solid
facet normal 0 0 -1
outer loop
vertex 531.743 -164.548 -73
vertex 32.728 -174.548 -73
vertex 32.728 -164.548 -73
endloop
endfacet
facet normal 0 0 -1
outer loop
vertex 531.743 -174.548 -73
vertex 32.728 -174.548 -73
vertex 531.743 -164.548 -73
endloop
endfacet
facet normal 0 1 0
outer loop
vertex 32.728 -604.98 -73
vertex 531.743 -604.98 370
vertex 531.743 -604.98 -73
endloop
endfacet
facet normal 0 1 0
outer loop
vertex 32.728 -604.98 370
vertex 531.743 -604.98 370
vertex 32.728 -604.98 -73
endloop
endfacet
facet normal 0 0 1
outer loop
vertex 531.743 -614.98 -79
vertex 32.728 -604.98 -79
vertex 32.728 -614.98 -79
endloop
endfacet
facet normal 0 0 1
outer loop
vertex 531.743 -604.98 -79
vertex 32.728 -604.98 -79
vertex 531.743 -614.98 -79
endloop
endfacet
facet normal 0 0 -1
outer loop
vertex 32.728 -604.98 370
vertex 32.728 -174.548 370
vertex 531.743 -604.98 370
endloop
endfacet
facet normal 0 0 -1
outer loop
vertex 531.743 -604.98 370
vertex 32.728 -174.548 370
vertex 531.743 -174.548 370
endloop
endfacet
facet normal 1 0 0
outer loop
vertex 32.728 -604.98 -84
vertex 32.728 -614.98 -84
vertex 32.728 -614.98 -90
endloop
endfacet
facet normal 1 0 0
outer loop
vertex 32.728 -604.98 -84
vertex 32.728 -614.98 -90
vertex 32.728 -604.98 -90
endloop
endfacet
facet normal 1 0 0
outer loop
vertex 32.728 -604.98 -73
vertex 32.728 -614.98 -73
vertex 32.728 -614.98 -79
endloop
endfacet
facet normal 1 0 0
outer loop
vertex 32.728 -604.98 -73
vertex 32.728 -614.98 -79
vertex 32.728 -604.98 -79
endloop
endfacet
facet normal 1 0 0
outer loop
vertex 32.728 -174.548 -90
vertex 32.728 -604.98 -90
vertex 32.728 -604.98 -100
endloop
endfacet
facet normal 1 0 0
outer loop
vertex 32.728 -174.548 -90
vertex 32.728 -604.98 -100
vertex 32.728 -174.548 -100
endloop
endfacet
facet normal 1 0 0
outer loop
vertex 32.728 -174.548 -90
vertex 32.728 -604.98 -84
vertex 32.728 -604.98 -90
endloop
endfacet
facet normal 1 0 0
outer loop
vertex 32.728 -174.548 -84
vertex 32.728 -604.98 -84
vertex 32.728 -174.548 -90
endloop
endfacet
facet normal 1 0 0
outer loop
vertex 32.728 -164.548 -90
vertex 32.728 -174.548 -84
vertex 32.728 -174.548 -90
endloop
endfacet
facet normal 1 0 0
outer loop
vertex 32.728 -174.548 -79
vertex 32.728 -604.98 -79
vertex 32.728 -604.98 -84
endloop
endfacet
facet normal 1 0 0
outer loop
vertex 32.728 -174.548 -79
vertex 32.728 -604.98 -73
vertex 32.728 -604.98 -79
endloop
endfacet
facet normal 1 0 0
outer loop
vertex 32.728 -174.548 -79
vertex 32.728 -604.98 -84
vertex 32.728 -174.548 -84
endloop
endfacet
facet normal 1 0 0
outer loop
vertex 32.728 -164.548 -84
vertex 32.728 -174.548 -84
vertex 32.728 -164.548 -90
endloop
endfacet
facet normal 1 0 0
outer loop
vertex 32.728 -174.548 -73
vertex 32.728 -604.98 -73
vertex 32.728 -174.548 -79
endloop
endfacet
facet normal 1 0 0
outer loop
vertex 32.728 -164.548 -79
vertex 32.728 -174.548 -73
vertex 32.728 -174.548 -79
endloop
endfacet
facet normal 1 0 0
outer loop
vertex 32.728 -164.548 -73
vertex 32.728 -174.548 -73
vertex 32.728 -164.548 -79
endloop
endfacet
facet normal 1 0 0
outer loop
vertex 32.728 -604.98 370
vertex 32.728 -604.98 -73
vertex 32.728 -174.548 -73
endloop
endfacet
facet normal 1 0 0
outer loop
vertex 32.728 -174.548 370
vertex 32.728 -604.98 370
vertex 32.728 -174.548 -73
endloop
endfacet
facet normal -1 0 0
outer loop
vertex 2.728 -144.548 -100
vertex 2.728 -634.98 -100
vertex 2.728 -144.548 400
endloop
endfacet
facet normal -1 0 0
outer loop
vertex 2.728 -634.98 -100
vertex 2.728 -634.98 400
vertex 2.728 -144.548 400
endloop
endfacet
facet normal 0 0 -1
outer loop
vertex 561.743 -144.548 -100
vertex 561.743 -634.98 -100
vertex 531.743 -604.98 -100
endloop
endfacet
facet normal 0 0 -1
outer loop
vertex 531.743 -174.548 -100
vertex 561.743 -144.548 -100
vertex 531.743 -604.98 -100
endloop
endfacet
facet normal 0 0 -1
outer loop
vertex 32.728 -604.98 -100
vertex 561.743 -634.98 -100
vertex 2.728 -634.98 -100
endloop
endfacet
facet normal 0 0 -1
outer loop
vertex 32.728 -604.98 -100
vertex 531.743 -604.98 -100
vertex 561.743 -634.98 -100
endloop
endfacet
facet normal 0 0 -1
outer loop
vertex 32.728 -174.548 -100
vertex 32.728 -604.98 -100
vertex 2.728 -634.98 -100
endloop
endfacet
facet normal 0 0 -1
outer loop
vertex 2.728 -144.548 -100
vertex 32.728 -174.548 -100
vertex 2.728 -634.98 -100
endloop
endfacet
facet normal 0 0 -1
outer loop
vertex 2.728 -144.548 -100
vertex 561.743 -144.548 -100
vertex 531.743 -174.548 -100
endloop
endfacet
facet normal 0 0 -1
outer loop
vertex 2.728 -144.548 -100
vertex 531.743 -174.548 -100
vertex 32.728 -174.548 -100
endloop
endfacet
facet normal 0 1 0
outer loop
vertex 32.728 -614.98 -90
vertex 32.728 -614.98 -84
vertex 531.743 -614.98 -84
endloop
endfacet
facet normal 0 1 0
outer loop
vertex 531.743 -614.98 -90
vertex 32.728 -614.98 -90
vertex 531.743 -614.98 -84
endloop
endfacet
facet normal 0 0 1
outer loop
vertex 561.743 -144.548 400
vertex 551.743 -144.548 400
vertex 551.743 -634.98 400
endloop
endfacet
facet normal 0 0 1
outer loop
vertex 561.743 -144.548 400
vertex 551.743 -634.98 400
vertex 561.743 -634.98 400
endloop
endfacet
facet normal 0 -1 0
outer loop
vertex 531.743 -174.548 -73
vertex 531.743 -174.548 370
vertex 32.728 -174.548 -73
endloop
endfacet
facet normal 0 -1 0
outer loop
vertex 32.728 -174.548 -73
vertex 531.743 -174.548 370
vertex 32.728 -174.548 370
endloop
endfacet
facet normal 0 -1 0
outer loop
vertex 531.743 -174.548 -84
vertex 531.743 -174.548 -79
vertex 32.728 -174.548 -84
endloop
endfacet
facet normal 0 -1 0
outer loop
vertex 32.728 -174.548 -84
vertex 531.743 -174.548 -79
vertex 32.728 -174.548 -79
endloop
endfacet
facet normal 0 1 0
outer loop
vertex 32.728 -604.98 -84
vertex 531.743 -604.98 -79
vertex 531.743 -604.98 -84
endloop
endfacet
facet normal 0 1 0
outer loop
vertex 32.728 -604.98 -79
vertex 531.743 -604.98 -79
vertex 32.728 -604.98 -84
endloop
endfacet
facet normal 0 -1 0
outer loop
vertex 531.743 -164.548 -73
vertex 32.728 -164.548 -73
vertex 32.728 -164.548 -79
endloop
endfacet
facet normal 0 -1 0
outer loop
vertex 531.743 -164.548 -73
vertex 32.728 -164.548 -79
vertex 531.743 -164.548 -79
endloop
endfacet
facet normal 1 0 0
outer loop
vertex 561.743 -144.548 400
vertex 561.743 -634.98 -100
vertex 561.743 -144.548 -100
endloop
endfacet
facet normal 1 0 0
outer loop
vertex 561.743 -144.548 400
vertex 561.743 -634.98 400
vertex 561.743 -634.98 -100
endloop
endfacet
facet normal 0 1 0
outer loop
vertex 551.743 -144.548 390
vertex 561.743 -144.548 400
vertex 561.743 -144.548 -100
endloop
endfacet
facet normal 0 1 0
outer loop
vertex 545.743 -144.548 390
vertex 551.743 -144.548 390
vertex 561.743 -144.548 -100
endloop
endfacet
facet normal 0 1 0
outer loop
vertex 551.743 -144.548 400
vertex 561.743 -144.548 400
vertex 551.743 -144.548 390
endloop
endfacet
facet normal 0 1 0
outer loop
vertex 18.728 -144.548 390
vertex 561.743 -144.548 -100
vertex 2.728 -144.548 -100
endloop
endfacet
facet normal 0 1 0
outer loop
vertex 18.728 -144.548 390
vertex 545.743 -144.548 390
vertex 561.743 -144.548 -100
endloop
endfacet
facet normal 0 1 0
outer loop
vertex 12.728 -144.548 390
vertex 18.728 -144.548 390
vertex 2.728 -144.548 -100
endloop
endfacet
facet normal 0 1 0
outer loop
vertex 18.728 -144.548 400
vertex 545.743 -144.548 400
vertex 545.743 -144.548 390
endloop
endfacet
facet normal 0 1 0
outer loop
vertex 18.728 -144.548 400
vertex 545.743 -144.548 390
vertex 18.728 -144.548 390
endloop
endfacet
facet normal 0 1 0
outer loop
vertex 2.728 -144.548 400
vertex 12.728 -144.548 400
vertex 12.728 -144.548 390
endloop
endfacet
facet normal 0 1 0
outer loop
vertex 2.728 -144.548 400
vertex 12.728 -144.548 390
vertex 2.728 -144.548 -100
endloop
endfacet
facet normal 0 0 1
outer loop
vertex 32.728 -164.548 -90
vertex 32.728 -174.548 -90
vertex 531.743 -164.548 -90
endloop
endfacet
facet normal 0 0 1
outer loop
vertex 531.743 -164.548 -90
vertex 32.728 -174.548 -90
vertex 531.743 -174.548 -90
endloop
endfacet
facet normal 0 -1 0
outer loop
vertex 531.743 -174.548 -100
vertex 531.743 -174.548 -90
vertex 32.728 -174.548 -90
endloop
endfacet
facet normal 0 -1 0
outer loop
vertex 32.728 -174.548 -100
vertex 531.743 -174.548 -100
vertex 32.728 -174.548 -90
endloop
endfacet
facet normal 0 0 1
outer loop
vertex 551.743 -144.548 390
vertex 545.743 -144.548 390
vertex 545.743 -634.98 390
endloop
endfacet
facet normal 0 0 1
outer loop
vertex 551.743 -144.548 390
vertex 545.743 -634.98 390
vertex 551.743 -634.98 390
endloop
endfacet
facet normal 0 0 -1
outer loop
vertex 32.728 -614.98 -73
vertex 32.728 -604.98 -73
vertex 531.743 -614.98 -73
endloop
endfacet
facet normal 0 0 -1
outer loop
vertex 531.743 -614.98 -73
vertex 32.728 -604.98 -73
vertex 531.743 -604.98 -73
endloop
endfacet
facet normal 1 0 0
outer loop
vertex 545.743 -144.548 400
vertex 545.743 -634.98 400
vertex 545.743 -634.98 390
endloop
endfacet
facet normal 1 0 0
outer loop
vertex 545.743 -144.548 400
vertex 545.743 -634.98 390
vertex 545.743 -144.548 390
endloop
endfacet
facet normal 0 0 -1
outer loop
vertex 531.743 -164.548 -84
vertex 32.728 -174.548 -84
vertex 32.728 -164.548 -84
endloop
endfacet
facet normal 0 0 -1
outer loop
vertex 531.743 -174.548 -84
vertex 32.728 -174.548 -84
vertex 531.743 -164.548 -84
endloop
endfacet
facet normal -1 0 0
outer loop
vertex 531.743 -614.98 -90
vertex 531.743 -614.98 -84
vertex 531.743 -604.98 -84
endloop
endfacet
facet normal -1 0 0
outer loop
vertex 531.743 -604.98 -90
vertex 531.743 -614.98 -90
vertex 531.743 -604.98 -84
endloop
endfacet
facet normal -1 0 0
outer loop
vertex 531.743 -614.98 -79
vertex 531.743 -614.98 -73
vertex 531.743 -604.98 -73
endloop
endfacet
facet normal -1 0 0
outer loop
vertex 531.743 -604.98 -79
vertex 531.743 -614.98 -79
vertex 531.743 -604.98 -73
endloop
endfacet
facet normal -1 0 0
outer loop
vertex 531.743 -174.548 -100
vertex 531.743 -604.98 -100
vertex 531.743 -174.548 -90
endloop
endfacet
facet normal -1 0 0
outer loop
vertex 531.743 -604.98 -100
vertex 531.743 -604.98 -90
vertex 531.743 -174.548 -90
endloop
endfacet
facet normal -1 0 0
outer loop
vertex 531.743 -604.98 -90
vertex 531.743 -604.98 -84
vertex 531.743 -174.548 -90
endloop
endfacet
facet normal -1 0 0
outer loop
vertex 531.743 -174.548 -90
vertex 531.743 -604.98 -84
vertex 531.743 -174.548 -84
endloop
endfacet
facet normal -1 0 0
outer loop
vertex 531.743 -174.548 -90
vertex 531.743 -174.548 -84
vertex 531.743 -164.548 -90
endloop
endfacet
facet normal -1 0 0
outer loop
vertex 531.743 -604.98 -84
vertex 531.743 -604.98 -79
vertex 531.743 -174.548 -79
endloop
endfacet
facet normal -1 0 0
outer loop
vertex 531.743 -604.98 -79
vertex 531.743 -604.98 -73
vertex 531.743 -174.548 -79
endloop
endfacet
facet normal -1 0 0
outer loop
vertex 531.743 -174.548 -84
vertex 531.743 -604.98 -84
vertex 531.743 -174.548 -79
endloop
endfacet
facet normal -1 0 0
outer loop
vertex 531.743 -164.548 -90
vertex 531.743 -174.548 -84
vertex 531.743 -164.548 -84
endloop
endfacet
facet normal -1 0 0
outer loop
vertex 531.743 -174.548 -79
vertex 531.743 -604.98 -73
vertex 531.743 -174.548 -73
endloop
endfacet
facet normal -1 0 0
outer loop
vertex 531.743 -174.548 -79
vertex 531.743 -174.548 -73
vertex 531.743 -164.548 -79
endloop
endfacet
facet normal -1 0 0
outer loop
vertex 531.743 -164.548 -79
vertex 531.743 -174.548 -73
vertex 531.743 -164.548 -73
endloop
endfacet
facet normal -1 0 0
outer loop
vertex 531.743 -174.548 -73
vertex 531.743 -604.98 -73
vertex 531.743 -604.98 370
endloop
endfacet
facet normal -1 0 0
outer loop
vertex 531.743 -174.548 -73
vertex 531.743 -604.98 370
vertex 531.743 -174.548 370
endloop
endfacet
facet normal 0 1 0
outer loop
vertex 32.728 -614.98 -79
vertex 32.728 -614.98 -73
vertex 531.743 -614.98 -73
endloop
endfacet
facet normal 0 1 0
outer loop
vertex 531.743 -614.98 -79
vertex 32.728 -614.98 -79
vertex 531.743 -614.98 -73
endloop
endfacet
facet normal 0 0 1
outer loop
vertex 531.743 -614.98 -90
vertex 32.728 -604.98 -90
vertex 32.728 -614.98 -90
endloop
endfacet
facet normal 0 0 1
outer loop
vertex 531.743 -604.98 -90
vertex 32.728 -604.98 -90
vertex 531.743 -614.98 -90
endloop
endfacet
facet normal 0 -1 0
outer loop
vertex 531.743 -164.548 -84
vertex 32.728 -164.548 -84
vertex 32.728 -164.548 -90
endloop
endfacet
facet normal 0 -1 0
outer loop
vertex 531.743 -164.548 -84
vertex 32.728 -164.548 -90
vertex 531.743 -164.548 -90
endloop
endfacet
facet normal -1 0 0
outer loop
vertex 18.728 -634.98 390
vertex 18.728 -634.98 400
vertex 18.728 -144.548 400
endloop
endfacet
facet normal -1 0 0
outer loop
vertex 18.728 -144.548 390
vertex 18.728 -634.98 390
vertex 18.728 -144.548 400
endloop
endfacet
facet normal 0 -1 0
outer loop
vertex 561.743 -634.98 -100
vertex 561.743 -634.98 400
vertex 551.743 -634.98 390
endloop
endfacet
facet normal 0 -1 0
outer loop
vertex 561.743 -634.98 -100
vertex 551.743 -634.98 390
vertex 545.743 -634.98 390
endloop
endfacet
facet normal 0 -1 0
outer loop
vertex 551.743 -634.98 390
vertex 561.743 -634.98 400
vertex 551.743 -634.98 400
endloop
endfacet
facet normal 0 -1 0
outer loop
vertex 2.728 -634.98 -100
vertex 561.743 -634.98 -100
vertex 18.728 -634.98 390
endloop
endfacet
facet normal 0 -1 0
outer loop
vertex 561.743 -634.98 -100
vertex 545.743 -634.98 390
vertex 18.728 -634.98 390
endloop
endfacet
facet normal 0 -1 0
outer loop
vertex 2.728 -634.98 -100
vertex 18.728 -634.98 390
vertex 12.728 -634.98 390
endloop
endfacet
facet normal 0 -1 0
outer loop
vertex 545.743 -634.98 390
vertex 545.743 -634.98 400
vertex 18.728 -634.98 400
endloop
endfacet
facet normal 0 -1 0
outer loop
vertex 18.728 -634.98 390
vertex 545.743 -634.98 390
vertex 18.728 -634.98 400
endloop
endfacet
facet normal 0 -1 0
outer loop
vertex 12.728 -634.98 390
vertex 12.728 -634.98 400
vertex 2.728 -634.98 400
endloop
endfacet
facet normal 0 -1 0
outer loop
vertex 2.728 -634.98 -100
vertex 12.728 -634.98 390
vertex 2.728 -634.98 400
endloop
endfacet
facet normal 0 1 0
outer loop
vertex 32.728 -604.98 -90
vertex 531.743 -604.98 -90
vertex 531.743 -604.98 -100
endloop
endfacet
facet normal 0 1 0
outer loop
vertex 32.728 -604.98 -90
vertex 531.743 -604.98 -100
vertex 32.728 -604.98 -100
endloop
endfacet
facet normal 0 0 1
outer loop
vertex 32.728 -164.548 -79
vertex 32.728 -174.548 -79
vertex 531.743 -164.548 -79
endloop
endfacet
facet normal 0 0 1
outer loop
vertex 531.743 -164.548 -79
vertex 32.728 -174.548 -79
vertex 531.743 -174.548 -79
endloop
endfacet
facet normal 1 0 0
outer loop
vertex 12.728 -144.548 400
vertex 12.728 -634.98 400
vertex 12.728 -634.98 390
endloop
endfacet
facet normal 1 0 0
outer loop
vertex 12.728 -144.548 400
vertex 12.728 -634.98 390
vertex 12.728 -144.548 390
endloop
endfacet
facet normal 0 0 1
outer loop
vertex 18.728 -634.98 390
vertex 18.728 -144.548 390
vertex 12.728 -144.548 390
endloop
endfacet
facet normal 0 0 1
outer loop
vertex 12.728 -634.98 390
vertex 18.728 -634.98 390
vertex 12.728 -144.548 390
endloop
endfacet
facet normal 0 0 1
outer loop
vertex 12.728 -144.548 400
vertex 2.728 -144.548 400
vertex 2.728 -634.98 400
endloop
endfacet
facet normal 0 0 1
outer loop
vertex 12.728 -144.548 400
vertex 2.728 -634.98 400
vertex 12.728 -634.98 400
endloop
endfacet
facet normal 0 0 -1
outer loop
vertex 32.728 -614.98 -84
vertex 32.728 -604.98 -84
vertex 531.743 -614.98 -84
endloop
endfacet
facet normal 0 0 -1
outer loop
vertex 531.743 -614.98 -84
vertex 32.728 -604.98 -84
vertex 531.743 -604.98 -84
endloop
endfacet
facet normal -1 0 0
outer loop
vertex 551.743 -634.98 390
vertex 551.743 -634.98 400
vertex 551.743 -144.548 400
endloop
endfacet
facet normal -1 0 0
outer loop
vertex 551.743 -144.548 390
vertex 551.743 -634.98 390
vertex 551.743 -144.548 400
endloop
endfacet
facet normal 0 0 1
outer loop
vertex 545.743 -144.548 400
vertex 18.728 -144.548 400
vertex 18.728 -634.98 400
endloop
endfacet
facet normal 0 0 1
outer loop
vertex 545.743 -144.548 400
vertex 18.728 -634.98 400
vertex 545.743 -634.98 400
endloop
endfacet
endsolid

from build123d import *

# Parameters (mm, degrees)
SKETCH_2_W           = 559.015307906
SKETCH_2_H           = 680
EXTRUDE_2_DEPTH      = 400
SKETCH_3_OUTSIDE_W   = 754.395
SKETCH_3_OUTSIDE_H   = 875.38
SKETCH_3_OUTSIDE_W_2 = 559.015307906
SKETCH_3_OUTSIDE_H_2 = 490.432891875
CUT_EXTRUDE_1_DEPTH  = 784.744027655
SKETCH_4_W           = 559.015307906
SKETCH_4_H           = 490.432891875
EXTRUDE_3_DEPTH      = 100
SHELL_2_T            = -30
SKETCH_5_W           = 499.015307907
SKETCH_5_H           = 6
CUT_EXTRUDE_2_DEPTH  = 10
SKETCH_6_W           = 499.015307907
SKETCH_6_H           = 6
CUT_EXTRUDE_3_DEPTH  = 10
SKETCH_7_W           = 6
SKETCH_7_H           = 490.432891874
CUT_EXTRUDE_4_DEPTH  = 10


with BuildPart() as part:
    # 草图2 → 凸台-拉伸2 (new body)
    with BuildSketch(Plane(origin=(180.83794206, -79.035754343, 0), x_dir=(1, 0, 0), z_dir=(0, 0, 1))):
        with Locations((101.397699083, -216.026809528)):
            Rectangle(SKETCH_2_W, SKETCH_2_H)
    extrude(amount=EXTRUDE_2_DEPTH)

    # 草图3 outside → 切除-拉伸1 (cut, through all)
    with BuildSketch(Plane(origin=(180.83794206, -79.035754343, 400), x_dir=(1, 0, 0), z_dir=(0, 0, 1))):
        with Locations((101.3975, -216.027)):
            Rectangle(SKETCH_3_OUTSIDE_W, SKETCH_3_OUTSIDE_H)
        with Locations((101.397699083, -310.72828395)):
            Rectangle(SKETCH_3_OUTSIDE_W_2, SKETCH_3_OUTSIDE_H_2, mode=Mode.SUBTRACT)
    extrude(amount=-CUT_EXTRUDE_1_DEPTH, mode=Mode.SUBTRACT)

    # 草图4 → 凸台-拉伸3 (add)
    with BuildSketch(Plane(origin=(180.83794206, -79.035754343, 0), x_dir=(-1, 0, 0), z_dir=(0, 0, -1))):
        with Locations((-101.397699083, -310.72828395)):
            Rectangle(SKETCH_4_W, SKETCH_4_H)
    extrude(amount=EXTRUDE_3_DEPTH)

    # 抽壳2
    shell_2_openings = [part.faces().sort_by_distance(p)[0] for p in [
        (282.235641143, -389.764038294, -100),
    ]]
    offset(amount=SHELL_2_T, openings=shell_2_openings, kind=Kind.INTERSECTION)

    # 草图5 → 切除-拉伸2 (cut)
    with BuildSketch(Plane.XZ.offset(174.547592357)):
        with Locations((282.235641143, -87)):
            Rectangle(SKETCH_5_W, SKETCH_5_H)
    cut_extrude_2 = extrude(amount=-CUT_EXTRUDE_2_DEPTH, mode=Mode.SUBTRACT)

    # 草图6 → 切除-拉伸3 (cut)
    with BuildSketch(Plane.XZ.offset(174.547592357)):
        with Locations((282.235641143, -76)):
            Rectangle(SKETCH_6_W, SKETCH_6_H)
    cut_extrude_3 = extrude(amount=-CUT_EXTRUDE_3_DEPTH, mode=Mode.SUBTRACT)

    # 镜向1: 切除-拉伸2, 切除-拉伸3 across plane
    add(cut_extrude_2.mirror(Plane(origin=(0, -389.764038294, 0), x_dir=(0, 0, 1), z_dir=(0, -1, 0))), mode=Mode.SUBTRACT)
    add(cut_extrude_3.mirror(Plane(origin=(0, -389.764038294, 0), x_dir=(0, 0, 1), z_dir=(0, -1, 0))), mode=Mode.SUBTRACT)

    # 草图7 → 切除-拉伸4 (cut)
    with BuildSketch(Plane.XY.offset(400)):
        with Locations((548.743295096, -389.764038294)):
            Rectangle(SKETCH_7_W, SKETCH_7_H)
    cut_extrude_4 = extrude(amount=-CUT_EXTRUDE_4_DEPTH, mode=Mode.SUBTRACT)

    # 镜向2: 切除-拉伸4 across plane
    add(cut_extrude_4.mirror(Plane.ZY.offset(-282.235641143)), mode=Mode.SUBTRACT)


solid = part.part
